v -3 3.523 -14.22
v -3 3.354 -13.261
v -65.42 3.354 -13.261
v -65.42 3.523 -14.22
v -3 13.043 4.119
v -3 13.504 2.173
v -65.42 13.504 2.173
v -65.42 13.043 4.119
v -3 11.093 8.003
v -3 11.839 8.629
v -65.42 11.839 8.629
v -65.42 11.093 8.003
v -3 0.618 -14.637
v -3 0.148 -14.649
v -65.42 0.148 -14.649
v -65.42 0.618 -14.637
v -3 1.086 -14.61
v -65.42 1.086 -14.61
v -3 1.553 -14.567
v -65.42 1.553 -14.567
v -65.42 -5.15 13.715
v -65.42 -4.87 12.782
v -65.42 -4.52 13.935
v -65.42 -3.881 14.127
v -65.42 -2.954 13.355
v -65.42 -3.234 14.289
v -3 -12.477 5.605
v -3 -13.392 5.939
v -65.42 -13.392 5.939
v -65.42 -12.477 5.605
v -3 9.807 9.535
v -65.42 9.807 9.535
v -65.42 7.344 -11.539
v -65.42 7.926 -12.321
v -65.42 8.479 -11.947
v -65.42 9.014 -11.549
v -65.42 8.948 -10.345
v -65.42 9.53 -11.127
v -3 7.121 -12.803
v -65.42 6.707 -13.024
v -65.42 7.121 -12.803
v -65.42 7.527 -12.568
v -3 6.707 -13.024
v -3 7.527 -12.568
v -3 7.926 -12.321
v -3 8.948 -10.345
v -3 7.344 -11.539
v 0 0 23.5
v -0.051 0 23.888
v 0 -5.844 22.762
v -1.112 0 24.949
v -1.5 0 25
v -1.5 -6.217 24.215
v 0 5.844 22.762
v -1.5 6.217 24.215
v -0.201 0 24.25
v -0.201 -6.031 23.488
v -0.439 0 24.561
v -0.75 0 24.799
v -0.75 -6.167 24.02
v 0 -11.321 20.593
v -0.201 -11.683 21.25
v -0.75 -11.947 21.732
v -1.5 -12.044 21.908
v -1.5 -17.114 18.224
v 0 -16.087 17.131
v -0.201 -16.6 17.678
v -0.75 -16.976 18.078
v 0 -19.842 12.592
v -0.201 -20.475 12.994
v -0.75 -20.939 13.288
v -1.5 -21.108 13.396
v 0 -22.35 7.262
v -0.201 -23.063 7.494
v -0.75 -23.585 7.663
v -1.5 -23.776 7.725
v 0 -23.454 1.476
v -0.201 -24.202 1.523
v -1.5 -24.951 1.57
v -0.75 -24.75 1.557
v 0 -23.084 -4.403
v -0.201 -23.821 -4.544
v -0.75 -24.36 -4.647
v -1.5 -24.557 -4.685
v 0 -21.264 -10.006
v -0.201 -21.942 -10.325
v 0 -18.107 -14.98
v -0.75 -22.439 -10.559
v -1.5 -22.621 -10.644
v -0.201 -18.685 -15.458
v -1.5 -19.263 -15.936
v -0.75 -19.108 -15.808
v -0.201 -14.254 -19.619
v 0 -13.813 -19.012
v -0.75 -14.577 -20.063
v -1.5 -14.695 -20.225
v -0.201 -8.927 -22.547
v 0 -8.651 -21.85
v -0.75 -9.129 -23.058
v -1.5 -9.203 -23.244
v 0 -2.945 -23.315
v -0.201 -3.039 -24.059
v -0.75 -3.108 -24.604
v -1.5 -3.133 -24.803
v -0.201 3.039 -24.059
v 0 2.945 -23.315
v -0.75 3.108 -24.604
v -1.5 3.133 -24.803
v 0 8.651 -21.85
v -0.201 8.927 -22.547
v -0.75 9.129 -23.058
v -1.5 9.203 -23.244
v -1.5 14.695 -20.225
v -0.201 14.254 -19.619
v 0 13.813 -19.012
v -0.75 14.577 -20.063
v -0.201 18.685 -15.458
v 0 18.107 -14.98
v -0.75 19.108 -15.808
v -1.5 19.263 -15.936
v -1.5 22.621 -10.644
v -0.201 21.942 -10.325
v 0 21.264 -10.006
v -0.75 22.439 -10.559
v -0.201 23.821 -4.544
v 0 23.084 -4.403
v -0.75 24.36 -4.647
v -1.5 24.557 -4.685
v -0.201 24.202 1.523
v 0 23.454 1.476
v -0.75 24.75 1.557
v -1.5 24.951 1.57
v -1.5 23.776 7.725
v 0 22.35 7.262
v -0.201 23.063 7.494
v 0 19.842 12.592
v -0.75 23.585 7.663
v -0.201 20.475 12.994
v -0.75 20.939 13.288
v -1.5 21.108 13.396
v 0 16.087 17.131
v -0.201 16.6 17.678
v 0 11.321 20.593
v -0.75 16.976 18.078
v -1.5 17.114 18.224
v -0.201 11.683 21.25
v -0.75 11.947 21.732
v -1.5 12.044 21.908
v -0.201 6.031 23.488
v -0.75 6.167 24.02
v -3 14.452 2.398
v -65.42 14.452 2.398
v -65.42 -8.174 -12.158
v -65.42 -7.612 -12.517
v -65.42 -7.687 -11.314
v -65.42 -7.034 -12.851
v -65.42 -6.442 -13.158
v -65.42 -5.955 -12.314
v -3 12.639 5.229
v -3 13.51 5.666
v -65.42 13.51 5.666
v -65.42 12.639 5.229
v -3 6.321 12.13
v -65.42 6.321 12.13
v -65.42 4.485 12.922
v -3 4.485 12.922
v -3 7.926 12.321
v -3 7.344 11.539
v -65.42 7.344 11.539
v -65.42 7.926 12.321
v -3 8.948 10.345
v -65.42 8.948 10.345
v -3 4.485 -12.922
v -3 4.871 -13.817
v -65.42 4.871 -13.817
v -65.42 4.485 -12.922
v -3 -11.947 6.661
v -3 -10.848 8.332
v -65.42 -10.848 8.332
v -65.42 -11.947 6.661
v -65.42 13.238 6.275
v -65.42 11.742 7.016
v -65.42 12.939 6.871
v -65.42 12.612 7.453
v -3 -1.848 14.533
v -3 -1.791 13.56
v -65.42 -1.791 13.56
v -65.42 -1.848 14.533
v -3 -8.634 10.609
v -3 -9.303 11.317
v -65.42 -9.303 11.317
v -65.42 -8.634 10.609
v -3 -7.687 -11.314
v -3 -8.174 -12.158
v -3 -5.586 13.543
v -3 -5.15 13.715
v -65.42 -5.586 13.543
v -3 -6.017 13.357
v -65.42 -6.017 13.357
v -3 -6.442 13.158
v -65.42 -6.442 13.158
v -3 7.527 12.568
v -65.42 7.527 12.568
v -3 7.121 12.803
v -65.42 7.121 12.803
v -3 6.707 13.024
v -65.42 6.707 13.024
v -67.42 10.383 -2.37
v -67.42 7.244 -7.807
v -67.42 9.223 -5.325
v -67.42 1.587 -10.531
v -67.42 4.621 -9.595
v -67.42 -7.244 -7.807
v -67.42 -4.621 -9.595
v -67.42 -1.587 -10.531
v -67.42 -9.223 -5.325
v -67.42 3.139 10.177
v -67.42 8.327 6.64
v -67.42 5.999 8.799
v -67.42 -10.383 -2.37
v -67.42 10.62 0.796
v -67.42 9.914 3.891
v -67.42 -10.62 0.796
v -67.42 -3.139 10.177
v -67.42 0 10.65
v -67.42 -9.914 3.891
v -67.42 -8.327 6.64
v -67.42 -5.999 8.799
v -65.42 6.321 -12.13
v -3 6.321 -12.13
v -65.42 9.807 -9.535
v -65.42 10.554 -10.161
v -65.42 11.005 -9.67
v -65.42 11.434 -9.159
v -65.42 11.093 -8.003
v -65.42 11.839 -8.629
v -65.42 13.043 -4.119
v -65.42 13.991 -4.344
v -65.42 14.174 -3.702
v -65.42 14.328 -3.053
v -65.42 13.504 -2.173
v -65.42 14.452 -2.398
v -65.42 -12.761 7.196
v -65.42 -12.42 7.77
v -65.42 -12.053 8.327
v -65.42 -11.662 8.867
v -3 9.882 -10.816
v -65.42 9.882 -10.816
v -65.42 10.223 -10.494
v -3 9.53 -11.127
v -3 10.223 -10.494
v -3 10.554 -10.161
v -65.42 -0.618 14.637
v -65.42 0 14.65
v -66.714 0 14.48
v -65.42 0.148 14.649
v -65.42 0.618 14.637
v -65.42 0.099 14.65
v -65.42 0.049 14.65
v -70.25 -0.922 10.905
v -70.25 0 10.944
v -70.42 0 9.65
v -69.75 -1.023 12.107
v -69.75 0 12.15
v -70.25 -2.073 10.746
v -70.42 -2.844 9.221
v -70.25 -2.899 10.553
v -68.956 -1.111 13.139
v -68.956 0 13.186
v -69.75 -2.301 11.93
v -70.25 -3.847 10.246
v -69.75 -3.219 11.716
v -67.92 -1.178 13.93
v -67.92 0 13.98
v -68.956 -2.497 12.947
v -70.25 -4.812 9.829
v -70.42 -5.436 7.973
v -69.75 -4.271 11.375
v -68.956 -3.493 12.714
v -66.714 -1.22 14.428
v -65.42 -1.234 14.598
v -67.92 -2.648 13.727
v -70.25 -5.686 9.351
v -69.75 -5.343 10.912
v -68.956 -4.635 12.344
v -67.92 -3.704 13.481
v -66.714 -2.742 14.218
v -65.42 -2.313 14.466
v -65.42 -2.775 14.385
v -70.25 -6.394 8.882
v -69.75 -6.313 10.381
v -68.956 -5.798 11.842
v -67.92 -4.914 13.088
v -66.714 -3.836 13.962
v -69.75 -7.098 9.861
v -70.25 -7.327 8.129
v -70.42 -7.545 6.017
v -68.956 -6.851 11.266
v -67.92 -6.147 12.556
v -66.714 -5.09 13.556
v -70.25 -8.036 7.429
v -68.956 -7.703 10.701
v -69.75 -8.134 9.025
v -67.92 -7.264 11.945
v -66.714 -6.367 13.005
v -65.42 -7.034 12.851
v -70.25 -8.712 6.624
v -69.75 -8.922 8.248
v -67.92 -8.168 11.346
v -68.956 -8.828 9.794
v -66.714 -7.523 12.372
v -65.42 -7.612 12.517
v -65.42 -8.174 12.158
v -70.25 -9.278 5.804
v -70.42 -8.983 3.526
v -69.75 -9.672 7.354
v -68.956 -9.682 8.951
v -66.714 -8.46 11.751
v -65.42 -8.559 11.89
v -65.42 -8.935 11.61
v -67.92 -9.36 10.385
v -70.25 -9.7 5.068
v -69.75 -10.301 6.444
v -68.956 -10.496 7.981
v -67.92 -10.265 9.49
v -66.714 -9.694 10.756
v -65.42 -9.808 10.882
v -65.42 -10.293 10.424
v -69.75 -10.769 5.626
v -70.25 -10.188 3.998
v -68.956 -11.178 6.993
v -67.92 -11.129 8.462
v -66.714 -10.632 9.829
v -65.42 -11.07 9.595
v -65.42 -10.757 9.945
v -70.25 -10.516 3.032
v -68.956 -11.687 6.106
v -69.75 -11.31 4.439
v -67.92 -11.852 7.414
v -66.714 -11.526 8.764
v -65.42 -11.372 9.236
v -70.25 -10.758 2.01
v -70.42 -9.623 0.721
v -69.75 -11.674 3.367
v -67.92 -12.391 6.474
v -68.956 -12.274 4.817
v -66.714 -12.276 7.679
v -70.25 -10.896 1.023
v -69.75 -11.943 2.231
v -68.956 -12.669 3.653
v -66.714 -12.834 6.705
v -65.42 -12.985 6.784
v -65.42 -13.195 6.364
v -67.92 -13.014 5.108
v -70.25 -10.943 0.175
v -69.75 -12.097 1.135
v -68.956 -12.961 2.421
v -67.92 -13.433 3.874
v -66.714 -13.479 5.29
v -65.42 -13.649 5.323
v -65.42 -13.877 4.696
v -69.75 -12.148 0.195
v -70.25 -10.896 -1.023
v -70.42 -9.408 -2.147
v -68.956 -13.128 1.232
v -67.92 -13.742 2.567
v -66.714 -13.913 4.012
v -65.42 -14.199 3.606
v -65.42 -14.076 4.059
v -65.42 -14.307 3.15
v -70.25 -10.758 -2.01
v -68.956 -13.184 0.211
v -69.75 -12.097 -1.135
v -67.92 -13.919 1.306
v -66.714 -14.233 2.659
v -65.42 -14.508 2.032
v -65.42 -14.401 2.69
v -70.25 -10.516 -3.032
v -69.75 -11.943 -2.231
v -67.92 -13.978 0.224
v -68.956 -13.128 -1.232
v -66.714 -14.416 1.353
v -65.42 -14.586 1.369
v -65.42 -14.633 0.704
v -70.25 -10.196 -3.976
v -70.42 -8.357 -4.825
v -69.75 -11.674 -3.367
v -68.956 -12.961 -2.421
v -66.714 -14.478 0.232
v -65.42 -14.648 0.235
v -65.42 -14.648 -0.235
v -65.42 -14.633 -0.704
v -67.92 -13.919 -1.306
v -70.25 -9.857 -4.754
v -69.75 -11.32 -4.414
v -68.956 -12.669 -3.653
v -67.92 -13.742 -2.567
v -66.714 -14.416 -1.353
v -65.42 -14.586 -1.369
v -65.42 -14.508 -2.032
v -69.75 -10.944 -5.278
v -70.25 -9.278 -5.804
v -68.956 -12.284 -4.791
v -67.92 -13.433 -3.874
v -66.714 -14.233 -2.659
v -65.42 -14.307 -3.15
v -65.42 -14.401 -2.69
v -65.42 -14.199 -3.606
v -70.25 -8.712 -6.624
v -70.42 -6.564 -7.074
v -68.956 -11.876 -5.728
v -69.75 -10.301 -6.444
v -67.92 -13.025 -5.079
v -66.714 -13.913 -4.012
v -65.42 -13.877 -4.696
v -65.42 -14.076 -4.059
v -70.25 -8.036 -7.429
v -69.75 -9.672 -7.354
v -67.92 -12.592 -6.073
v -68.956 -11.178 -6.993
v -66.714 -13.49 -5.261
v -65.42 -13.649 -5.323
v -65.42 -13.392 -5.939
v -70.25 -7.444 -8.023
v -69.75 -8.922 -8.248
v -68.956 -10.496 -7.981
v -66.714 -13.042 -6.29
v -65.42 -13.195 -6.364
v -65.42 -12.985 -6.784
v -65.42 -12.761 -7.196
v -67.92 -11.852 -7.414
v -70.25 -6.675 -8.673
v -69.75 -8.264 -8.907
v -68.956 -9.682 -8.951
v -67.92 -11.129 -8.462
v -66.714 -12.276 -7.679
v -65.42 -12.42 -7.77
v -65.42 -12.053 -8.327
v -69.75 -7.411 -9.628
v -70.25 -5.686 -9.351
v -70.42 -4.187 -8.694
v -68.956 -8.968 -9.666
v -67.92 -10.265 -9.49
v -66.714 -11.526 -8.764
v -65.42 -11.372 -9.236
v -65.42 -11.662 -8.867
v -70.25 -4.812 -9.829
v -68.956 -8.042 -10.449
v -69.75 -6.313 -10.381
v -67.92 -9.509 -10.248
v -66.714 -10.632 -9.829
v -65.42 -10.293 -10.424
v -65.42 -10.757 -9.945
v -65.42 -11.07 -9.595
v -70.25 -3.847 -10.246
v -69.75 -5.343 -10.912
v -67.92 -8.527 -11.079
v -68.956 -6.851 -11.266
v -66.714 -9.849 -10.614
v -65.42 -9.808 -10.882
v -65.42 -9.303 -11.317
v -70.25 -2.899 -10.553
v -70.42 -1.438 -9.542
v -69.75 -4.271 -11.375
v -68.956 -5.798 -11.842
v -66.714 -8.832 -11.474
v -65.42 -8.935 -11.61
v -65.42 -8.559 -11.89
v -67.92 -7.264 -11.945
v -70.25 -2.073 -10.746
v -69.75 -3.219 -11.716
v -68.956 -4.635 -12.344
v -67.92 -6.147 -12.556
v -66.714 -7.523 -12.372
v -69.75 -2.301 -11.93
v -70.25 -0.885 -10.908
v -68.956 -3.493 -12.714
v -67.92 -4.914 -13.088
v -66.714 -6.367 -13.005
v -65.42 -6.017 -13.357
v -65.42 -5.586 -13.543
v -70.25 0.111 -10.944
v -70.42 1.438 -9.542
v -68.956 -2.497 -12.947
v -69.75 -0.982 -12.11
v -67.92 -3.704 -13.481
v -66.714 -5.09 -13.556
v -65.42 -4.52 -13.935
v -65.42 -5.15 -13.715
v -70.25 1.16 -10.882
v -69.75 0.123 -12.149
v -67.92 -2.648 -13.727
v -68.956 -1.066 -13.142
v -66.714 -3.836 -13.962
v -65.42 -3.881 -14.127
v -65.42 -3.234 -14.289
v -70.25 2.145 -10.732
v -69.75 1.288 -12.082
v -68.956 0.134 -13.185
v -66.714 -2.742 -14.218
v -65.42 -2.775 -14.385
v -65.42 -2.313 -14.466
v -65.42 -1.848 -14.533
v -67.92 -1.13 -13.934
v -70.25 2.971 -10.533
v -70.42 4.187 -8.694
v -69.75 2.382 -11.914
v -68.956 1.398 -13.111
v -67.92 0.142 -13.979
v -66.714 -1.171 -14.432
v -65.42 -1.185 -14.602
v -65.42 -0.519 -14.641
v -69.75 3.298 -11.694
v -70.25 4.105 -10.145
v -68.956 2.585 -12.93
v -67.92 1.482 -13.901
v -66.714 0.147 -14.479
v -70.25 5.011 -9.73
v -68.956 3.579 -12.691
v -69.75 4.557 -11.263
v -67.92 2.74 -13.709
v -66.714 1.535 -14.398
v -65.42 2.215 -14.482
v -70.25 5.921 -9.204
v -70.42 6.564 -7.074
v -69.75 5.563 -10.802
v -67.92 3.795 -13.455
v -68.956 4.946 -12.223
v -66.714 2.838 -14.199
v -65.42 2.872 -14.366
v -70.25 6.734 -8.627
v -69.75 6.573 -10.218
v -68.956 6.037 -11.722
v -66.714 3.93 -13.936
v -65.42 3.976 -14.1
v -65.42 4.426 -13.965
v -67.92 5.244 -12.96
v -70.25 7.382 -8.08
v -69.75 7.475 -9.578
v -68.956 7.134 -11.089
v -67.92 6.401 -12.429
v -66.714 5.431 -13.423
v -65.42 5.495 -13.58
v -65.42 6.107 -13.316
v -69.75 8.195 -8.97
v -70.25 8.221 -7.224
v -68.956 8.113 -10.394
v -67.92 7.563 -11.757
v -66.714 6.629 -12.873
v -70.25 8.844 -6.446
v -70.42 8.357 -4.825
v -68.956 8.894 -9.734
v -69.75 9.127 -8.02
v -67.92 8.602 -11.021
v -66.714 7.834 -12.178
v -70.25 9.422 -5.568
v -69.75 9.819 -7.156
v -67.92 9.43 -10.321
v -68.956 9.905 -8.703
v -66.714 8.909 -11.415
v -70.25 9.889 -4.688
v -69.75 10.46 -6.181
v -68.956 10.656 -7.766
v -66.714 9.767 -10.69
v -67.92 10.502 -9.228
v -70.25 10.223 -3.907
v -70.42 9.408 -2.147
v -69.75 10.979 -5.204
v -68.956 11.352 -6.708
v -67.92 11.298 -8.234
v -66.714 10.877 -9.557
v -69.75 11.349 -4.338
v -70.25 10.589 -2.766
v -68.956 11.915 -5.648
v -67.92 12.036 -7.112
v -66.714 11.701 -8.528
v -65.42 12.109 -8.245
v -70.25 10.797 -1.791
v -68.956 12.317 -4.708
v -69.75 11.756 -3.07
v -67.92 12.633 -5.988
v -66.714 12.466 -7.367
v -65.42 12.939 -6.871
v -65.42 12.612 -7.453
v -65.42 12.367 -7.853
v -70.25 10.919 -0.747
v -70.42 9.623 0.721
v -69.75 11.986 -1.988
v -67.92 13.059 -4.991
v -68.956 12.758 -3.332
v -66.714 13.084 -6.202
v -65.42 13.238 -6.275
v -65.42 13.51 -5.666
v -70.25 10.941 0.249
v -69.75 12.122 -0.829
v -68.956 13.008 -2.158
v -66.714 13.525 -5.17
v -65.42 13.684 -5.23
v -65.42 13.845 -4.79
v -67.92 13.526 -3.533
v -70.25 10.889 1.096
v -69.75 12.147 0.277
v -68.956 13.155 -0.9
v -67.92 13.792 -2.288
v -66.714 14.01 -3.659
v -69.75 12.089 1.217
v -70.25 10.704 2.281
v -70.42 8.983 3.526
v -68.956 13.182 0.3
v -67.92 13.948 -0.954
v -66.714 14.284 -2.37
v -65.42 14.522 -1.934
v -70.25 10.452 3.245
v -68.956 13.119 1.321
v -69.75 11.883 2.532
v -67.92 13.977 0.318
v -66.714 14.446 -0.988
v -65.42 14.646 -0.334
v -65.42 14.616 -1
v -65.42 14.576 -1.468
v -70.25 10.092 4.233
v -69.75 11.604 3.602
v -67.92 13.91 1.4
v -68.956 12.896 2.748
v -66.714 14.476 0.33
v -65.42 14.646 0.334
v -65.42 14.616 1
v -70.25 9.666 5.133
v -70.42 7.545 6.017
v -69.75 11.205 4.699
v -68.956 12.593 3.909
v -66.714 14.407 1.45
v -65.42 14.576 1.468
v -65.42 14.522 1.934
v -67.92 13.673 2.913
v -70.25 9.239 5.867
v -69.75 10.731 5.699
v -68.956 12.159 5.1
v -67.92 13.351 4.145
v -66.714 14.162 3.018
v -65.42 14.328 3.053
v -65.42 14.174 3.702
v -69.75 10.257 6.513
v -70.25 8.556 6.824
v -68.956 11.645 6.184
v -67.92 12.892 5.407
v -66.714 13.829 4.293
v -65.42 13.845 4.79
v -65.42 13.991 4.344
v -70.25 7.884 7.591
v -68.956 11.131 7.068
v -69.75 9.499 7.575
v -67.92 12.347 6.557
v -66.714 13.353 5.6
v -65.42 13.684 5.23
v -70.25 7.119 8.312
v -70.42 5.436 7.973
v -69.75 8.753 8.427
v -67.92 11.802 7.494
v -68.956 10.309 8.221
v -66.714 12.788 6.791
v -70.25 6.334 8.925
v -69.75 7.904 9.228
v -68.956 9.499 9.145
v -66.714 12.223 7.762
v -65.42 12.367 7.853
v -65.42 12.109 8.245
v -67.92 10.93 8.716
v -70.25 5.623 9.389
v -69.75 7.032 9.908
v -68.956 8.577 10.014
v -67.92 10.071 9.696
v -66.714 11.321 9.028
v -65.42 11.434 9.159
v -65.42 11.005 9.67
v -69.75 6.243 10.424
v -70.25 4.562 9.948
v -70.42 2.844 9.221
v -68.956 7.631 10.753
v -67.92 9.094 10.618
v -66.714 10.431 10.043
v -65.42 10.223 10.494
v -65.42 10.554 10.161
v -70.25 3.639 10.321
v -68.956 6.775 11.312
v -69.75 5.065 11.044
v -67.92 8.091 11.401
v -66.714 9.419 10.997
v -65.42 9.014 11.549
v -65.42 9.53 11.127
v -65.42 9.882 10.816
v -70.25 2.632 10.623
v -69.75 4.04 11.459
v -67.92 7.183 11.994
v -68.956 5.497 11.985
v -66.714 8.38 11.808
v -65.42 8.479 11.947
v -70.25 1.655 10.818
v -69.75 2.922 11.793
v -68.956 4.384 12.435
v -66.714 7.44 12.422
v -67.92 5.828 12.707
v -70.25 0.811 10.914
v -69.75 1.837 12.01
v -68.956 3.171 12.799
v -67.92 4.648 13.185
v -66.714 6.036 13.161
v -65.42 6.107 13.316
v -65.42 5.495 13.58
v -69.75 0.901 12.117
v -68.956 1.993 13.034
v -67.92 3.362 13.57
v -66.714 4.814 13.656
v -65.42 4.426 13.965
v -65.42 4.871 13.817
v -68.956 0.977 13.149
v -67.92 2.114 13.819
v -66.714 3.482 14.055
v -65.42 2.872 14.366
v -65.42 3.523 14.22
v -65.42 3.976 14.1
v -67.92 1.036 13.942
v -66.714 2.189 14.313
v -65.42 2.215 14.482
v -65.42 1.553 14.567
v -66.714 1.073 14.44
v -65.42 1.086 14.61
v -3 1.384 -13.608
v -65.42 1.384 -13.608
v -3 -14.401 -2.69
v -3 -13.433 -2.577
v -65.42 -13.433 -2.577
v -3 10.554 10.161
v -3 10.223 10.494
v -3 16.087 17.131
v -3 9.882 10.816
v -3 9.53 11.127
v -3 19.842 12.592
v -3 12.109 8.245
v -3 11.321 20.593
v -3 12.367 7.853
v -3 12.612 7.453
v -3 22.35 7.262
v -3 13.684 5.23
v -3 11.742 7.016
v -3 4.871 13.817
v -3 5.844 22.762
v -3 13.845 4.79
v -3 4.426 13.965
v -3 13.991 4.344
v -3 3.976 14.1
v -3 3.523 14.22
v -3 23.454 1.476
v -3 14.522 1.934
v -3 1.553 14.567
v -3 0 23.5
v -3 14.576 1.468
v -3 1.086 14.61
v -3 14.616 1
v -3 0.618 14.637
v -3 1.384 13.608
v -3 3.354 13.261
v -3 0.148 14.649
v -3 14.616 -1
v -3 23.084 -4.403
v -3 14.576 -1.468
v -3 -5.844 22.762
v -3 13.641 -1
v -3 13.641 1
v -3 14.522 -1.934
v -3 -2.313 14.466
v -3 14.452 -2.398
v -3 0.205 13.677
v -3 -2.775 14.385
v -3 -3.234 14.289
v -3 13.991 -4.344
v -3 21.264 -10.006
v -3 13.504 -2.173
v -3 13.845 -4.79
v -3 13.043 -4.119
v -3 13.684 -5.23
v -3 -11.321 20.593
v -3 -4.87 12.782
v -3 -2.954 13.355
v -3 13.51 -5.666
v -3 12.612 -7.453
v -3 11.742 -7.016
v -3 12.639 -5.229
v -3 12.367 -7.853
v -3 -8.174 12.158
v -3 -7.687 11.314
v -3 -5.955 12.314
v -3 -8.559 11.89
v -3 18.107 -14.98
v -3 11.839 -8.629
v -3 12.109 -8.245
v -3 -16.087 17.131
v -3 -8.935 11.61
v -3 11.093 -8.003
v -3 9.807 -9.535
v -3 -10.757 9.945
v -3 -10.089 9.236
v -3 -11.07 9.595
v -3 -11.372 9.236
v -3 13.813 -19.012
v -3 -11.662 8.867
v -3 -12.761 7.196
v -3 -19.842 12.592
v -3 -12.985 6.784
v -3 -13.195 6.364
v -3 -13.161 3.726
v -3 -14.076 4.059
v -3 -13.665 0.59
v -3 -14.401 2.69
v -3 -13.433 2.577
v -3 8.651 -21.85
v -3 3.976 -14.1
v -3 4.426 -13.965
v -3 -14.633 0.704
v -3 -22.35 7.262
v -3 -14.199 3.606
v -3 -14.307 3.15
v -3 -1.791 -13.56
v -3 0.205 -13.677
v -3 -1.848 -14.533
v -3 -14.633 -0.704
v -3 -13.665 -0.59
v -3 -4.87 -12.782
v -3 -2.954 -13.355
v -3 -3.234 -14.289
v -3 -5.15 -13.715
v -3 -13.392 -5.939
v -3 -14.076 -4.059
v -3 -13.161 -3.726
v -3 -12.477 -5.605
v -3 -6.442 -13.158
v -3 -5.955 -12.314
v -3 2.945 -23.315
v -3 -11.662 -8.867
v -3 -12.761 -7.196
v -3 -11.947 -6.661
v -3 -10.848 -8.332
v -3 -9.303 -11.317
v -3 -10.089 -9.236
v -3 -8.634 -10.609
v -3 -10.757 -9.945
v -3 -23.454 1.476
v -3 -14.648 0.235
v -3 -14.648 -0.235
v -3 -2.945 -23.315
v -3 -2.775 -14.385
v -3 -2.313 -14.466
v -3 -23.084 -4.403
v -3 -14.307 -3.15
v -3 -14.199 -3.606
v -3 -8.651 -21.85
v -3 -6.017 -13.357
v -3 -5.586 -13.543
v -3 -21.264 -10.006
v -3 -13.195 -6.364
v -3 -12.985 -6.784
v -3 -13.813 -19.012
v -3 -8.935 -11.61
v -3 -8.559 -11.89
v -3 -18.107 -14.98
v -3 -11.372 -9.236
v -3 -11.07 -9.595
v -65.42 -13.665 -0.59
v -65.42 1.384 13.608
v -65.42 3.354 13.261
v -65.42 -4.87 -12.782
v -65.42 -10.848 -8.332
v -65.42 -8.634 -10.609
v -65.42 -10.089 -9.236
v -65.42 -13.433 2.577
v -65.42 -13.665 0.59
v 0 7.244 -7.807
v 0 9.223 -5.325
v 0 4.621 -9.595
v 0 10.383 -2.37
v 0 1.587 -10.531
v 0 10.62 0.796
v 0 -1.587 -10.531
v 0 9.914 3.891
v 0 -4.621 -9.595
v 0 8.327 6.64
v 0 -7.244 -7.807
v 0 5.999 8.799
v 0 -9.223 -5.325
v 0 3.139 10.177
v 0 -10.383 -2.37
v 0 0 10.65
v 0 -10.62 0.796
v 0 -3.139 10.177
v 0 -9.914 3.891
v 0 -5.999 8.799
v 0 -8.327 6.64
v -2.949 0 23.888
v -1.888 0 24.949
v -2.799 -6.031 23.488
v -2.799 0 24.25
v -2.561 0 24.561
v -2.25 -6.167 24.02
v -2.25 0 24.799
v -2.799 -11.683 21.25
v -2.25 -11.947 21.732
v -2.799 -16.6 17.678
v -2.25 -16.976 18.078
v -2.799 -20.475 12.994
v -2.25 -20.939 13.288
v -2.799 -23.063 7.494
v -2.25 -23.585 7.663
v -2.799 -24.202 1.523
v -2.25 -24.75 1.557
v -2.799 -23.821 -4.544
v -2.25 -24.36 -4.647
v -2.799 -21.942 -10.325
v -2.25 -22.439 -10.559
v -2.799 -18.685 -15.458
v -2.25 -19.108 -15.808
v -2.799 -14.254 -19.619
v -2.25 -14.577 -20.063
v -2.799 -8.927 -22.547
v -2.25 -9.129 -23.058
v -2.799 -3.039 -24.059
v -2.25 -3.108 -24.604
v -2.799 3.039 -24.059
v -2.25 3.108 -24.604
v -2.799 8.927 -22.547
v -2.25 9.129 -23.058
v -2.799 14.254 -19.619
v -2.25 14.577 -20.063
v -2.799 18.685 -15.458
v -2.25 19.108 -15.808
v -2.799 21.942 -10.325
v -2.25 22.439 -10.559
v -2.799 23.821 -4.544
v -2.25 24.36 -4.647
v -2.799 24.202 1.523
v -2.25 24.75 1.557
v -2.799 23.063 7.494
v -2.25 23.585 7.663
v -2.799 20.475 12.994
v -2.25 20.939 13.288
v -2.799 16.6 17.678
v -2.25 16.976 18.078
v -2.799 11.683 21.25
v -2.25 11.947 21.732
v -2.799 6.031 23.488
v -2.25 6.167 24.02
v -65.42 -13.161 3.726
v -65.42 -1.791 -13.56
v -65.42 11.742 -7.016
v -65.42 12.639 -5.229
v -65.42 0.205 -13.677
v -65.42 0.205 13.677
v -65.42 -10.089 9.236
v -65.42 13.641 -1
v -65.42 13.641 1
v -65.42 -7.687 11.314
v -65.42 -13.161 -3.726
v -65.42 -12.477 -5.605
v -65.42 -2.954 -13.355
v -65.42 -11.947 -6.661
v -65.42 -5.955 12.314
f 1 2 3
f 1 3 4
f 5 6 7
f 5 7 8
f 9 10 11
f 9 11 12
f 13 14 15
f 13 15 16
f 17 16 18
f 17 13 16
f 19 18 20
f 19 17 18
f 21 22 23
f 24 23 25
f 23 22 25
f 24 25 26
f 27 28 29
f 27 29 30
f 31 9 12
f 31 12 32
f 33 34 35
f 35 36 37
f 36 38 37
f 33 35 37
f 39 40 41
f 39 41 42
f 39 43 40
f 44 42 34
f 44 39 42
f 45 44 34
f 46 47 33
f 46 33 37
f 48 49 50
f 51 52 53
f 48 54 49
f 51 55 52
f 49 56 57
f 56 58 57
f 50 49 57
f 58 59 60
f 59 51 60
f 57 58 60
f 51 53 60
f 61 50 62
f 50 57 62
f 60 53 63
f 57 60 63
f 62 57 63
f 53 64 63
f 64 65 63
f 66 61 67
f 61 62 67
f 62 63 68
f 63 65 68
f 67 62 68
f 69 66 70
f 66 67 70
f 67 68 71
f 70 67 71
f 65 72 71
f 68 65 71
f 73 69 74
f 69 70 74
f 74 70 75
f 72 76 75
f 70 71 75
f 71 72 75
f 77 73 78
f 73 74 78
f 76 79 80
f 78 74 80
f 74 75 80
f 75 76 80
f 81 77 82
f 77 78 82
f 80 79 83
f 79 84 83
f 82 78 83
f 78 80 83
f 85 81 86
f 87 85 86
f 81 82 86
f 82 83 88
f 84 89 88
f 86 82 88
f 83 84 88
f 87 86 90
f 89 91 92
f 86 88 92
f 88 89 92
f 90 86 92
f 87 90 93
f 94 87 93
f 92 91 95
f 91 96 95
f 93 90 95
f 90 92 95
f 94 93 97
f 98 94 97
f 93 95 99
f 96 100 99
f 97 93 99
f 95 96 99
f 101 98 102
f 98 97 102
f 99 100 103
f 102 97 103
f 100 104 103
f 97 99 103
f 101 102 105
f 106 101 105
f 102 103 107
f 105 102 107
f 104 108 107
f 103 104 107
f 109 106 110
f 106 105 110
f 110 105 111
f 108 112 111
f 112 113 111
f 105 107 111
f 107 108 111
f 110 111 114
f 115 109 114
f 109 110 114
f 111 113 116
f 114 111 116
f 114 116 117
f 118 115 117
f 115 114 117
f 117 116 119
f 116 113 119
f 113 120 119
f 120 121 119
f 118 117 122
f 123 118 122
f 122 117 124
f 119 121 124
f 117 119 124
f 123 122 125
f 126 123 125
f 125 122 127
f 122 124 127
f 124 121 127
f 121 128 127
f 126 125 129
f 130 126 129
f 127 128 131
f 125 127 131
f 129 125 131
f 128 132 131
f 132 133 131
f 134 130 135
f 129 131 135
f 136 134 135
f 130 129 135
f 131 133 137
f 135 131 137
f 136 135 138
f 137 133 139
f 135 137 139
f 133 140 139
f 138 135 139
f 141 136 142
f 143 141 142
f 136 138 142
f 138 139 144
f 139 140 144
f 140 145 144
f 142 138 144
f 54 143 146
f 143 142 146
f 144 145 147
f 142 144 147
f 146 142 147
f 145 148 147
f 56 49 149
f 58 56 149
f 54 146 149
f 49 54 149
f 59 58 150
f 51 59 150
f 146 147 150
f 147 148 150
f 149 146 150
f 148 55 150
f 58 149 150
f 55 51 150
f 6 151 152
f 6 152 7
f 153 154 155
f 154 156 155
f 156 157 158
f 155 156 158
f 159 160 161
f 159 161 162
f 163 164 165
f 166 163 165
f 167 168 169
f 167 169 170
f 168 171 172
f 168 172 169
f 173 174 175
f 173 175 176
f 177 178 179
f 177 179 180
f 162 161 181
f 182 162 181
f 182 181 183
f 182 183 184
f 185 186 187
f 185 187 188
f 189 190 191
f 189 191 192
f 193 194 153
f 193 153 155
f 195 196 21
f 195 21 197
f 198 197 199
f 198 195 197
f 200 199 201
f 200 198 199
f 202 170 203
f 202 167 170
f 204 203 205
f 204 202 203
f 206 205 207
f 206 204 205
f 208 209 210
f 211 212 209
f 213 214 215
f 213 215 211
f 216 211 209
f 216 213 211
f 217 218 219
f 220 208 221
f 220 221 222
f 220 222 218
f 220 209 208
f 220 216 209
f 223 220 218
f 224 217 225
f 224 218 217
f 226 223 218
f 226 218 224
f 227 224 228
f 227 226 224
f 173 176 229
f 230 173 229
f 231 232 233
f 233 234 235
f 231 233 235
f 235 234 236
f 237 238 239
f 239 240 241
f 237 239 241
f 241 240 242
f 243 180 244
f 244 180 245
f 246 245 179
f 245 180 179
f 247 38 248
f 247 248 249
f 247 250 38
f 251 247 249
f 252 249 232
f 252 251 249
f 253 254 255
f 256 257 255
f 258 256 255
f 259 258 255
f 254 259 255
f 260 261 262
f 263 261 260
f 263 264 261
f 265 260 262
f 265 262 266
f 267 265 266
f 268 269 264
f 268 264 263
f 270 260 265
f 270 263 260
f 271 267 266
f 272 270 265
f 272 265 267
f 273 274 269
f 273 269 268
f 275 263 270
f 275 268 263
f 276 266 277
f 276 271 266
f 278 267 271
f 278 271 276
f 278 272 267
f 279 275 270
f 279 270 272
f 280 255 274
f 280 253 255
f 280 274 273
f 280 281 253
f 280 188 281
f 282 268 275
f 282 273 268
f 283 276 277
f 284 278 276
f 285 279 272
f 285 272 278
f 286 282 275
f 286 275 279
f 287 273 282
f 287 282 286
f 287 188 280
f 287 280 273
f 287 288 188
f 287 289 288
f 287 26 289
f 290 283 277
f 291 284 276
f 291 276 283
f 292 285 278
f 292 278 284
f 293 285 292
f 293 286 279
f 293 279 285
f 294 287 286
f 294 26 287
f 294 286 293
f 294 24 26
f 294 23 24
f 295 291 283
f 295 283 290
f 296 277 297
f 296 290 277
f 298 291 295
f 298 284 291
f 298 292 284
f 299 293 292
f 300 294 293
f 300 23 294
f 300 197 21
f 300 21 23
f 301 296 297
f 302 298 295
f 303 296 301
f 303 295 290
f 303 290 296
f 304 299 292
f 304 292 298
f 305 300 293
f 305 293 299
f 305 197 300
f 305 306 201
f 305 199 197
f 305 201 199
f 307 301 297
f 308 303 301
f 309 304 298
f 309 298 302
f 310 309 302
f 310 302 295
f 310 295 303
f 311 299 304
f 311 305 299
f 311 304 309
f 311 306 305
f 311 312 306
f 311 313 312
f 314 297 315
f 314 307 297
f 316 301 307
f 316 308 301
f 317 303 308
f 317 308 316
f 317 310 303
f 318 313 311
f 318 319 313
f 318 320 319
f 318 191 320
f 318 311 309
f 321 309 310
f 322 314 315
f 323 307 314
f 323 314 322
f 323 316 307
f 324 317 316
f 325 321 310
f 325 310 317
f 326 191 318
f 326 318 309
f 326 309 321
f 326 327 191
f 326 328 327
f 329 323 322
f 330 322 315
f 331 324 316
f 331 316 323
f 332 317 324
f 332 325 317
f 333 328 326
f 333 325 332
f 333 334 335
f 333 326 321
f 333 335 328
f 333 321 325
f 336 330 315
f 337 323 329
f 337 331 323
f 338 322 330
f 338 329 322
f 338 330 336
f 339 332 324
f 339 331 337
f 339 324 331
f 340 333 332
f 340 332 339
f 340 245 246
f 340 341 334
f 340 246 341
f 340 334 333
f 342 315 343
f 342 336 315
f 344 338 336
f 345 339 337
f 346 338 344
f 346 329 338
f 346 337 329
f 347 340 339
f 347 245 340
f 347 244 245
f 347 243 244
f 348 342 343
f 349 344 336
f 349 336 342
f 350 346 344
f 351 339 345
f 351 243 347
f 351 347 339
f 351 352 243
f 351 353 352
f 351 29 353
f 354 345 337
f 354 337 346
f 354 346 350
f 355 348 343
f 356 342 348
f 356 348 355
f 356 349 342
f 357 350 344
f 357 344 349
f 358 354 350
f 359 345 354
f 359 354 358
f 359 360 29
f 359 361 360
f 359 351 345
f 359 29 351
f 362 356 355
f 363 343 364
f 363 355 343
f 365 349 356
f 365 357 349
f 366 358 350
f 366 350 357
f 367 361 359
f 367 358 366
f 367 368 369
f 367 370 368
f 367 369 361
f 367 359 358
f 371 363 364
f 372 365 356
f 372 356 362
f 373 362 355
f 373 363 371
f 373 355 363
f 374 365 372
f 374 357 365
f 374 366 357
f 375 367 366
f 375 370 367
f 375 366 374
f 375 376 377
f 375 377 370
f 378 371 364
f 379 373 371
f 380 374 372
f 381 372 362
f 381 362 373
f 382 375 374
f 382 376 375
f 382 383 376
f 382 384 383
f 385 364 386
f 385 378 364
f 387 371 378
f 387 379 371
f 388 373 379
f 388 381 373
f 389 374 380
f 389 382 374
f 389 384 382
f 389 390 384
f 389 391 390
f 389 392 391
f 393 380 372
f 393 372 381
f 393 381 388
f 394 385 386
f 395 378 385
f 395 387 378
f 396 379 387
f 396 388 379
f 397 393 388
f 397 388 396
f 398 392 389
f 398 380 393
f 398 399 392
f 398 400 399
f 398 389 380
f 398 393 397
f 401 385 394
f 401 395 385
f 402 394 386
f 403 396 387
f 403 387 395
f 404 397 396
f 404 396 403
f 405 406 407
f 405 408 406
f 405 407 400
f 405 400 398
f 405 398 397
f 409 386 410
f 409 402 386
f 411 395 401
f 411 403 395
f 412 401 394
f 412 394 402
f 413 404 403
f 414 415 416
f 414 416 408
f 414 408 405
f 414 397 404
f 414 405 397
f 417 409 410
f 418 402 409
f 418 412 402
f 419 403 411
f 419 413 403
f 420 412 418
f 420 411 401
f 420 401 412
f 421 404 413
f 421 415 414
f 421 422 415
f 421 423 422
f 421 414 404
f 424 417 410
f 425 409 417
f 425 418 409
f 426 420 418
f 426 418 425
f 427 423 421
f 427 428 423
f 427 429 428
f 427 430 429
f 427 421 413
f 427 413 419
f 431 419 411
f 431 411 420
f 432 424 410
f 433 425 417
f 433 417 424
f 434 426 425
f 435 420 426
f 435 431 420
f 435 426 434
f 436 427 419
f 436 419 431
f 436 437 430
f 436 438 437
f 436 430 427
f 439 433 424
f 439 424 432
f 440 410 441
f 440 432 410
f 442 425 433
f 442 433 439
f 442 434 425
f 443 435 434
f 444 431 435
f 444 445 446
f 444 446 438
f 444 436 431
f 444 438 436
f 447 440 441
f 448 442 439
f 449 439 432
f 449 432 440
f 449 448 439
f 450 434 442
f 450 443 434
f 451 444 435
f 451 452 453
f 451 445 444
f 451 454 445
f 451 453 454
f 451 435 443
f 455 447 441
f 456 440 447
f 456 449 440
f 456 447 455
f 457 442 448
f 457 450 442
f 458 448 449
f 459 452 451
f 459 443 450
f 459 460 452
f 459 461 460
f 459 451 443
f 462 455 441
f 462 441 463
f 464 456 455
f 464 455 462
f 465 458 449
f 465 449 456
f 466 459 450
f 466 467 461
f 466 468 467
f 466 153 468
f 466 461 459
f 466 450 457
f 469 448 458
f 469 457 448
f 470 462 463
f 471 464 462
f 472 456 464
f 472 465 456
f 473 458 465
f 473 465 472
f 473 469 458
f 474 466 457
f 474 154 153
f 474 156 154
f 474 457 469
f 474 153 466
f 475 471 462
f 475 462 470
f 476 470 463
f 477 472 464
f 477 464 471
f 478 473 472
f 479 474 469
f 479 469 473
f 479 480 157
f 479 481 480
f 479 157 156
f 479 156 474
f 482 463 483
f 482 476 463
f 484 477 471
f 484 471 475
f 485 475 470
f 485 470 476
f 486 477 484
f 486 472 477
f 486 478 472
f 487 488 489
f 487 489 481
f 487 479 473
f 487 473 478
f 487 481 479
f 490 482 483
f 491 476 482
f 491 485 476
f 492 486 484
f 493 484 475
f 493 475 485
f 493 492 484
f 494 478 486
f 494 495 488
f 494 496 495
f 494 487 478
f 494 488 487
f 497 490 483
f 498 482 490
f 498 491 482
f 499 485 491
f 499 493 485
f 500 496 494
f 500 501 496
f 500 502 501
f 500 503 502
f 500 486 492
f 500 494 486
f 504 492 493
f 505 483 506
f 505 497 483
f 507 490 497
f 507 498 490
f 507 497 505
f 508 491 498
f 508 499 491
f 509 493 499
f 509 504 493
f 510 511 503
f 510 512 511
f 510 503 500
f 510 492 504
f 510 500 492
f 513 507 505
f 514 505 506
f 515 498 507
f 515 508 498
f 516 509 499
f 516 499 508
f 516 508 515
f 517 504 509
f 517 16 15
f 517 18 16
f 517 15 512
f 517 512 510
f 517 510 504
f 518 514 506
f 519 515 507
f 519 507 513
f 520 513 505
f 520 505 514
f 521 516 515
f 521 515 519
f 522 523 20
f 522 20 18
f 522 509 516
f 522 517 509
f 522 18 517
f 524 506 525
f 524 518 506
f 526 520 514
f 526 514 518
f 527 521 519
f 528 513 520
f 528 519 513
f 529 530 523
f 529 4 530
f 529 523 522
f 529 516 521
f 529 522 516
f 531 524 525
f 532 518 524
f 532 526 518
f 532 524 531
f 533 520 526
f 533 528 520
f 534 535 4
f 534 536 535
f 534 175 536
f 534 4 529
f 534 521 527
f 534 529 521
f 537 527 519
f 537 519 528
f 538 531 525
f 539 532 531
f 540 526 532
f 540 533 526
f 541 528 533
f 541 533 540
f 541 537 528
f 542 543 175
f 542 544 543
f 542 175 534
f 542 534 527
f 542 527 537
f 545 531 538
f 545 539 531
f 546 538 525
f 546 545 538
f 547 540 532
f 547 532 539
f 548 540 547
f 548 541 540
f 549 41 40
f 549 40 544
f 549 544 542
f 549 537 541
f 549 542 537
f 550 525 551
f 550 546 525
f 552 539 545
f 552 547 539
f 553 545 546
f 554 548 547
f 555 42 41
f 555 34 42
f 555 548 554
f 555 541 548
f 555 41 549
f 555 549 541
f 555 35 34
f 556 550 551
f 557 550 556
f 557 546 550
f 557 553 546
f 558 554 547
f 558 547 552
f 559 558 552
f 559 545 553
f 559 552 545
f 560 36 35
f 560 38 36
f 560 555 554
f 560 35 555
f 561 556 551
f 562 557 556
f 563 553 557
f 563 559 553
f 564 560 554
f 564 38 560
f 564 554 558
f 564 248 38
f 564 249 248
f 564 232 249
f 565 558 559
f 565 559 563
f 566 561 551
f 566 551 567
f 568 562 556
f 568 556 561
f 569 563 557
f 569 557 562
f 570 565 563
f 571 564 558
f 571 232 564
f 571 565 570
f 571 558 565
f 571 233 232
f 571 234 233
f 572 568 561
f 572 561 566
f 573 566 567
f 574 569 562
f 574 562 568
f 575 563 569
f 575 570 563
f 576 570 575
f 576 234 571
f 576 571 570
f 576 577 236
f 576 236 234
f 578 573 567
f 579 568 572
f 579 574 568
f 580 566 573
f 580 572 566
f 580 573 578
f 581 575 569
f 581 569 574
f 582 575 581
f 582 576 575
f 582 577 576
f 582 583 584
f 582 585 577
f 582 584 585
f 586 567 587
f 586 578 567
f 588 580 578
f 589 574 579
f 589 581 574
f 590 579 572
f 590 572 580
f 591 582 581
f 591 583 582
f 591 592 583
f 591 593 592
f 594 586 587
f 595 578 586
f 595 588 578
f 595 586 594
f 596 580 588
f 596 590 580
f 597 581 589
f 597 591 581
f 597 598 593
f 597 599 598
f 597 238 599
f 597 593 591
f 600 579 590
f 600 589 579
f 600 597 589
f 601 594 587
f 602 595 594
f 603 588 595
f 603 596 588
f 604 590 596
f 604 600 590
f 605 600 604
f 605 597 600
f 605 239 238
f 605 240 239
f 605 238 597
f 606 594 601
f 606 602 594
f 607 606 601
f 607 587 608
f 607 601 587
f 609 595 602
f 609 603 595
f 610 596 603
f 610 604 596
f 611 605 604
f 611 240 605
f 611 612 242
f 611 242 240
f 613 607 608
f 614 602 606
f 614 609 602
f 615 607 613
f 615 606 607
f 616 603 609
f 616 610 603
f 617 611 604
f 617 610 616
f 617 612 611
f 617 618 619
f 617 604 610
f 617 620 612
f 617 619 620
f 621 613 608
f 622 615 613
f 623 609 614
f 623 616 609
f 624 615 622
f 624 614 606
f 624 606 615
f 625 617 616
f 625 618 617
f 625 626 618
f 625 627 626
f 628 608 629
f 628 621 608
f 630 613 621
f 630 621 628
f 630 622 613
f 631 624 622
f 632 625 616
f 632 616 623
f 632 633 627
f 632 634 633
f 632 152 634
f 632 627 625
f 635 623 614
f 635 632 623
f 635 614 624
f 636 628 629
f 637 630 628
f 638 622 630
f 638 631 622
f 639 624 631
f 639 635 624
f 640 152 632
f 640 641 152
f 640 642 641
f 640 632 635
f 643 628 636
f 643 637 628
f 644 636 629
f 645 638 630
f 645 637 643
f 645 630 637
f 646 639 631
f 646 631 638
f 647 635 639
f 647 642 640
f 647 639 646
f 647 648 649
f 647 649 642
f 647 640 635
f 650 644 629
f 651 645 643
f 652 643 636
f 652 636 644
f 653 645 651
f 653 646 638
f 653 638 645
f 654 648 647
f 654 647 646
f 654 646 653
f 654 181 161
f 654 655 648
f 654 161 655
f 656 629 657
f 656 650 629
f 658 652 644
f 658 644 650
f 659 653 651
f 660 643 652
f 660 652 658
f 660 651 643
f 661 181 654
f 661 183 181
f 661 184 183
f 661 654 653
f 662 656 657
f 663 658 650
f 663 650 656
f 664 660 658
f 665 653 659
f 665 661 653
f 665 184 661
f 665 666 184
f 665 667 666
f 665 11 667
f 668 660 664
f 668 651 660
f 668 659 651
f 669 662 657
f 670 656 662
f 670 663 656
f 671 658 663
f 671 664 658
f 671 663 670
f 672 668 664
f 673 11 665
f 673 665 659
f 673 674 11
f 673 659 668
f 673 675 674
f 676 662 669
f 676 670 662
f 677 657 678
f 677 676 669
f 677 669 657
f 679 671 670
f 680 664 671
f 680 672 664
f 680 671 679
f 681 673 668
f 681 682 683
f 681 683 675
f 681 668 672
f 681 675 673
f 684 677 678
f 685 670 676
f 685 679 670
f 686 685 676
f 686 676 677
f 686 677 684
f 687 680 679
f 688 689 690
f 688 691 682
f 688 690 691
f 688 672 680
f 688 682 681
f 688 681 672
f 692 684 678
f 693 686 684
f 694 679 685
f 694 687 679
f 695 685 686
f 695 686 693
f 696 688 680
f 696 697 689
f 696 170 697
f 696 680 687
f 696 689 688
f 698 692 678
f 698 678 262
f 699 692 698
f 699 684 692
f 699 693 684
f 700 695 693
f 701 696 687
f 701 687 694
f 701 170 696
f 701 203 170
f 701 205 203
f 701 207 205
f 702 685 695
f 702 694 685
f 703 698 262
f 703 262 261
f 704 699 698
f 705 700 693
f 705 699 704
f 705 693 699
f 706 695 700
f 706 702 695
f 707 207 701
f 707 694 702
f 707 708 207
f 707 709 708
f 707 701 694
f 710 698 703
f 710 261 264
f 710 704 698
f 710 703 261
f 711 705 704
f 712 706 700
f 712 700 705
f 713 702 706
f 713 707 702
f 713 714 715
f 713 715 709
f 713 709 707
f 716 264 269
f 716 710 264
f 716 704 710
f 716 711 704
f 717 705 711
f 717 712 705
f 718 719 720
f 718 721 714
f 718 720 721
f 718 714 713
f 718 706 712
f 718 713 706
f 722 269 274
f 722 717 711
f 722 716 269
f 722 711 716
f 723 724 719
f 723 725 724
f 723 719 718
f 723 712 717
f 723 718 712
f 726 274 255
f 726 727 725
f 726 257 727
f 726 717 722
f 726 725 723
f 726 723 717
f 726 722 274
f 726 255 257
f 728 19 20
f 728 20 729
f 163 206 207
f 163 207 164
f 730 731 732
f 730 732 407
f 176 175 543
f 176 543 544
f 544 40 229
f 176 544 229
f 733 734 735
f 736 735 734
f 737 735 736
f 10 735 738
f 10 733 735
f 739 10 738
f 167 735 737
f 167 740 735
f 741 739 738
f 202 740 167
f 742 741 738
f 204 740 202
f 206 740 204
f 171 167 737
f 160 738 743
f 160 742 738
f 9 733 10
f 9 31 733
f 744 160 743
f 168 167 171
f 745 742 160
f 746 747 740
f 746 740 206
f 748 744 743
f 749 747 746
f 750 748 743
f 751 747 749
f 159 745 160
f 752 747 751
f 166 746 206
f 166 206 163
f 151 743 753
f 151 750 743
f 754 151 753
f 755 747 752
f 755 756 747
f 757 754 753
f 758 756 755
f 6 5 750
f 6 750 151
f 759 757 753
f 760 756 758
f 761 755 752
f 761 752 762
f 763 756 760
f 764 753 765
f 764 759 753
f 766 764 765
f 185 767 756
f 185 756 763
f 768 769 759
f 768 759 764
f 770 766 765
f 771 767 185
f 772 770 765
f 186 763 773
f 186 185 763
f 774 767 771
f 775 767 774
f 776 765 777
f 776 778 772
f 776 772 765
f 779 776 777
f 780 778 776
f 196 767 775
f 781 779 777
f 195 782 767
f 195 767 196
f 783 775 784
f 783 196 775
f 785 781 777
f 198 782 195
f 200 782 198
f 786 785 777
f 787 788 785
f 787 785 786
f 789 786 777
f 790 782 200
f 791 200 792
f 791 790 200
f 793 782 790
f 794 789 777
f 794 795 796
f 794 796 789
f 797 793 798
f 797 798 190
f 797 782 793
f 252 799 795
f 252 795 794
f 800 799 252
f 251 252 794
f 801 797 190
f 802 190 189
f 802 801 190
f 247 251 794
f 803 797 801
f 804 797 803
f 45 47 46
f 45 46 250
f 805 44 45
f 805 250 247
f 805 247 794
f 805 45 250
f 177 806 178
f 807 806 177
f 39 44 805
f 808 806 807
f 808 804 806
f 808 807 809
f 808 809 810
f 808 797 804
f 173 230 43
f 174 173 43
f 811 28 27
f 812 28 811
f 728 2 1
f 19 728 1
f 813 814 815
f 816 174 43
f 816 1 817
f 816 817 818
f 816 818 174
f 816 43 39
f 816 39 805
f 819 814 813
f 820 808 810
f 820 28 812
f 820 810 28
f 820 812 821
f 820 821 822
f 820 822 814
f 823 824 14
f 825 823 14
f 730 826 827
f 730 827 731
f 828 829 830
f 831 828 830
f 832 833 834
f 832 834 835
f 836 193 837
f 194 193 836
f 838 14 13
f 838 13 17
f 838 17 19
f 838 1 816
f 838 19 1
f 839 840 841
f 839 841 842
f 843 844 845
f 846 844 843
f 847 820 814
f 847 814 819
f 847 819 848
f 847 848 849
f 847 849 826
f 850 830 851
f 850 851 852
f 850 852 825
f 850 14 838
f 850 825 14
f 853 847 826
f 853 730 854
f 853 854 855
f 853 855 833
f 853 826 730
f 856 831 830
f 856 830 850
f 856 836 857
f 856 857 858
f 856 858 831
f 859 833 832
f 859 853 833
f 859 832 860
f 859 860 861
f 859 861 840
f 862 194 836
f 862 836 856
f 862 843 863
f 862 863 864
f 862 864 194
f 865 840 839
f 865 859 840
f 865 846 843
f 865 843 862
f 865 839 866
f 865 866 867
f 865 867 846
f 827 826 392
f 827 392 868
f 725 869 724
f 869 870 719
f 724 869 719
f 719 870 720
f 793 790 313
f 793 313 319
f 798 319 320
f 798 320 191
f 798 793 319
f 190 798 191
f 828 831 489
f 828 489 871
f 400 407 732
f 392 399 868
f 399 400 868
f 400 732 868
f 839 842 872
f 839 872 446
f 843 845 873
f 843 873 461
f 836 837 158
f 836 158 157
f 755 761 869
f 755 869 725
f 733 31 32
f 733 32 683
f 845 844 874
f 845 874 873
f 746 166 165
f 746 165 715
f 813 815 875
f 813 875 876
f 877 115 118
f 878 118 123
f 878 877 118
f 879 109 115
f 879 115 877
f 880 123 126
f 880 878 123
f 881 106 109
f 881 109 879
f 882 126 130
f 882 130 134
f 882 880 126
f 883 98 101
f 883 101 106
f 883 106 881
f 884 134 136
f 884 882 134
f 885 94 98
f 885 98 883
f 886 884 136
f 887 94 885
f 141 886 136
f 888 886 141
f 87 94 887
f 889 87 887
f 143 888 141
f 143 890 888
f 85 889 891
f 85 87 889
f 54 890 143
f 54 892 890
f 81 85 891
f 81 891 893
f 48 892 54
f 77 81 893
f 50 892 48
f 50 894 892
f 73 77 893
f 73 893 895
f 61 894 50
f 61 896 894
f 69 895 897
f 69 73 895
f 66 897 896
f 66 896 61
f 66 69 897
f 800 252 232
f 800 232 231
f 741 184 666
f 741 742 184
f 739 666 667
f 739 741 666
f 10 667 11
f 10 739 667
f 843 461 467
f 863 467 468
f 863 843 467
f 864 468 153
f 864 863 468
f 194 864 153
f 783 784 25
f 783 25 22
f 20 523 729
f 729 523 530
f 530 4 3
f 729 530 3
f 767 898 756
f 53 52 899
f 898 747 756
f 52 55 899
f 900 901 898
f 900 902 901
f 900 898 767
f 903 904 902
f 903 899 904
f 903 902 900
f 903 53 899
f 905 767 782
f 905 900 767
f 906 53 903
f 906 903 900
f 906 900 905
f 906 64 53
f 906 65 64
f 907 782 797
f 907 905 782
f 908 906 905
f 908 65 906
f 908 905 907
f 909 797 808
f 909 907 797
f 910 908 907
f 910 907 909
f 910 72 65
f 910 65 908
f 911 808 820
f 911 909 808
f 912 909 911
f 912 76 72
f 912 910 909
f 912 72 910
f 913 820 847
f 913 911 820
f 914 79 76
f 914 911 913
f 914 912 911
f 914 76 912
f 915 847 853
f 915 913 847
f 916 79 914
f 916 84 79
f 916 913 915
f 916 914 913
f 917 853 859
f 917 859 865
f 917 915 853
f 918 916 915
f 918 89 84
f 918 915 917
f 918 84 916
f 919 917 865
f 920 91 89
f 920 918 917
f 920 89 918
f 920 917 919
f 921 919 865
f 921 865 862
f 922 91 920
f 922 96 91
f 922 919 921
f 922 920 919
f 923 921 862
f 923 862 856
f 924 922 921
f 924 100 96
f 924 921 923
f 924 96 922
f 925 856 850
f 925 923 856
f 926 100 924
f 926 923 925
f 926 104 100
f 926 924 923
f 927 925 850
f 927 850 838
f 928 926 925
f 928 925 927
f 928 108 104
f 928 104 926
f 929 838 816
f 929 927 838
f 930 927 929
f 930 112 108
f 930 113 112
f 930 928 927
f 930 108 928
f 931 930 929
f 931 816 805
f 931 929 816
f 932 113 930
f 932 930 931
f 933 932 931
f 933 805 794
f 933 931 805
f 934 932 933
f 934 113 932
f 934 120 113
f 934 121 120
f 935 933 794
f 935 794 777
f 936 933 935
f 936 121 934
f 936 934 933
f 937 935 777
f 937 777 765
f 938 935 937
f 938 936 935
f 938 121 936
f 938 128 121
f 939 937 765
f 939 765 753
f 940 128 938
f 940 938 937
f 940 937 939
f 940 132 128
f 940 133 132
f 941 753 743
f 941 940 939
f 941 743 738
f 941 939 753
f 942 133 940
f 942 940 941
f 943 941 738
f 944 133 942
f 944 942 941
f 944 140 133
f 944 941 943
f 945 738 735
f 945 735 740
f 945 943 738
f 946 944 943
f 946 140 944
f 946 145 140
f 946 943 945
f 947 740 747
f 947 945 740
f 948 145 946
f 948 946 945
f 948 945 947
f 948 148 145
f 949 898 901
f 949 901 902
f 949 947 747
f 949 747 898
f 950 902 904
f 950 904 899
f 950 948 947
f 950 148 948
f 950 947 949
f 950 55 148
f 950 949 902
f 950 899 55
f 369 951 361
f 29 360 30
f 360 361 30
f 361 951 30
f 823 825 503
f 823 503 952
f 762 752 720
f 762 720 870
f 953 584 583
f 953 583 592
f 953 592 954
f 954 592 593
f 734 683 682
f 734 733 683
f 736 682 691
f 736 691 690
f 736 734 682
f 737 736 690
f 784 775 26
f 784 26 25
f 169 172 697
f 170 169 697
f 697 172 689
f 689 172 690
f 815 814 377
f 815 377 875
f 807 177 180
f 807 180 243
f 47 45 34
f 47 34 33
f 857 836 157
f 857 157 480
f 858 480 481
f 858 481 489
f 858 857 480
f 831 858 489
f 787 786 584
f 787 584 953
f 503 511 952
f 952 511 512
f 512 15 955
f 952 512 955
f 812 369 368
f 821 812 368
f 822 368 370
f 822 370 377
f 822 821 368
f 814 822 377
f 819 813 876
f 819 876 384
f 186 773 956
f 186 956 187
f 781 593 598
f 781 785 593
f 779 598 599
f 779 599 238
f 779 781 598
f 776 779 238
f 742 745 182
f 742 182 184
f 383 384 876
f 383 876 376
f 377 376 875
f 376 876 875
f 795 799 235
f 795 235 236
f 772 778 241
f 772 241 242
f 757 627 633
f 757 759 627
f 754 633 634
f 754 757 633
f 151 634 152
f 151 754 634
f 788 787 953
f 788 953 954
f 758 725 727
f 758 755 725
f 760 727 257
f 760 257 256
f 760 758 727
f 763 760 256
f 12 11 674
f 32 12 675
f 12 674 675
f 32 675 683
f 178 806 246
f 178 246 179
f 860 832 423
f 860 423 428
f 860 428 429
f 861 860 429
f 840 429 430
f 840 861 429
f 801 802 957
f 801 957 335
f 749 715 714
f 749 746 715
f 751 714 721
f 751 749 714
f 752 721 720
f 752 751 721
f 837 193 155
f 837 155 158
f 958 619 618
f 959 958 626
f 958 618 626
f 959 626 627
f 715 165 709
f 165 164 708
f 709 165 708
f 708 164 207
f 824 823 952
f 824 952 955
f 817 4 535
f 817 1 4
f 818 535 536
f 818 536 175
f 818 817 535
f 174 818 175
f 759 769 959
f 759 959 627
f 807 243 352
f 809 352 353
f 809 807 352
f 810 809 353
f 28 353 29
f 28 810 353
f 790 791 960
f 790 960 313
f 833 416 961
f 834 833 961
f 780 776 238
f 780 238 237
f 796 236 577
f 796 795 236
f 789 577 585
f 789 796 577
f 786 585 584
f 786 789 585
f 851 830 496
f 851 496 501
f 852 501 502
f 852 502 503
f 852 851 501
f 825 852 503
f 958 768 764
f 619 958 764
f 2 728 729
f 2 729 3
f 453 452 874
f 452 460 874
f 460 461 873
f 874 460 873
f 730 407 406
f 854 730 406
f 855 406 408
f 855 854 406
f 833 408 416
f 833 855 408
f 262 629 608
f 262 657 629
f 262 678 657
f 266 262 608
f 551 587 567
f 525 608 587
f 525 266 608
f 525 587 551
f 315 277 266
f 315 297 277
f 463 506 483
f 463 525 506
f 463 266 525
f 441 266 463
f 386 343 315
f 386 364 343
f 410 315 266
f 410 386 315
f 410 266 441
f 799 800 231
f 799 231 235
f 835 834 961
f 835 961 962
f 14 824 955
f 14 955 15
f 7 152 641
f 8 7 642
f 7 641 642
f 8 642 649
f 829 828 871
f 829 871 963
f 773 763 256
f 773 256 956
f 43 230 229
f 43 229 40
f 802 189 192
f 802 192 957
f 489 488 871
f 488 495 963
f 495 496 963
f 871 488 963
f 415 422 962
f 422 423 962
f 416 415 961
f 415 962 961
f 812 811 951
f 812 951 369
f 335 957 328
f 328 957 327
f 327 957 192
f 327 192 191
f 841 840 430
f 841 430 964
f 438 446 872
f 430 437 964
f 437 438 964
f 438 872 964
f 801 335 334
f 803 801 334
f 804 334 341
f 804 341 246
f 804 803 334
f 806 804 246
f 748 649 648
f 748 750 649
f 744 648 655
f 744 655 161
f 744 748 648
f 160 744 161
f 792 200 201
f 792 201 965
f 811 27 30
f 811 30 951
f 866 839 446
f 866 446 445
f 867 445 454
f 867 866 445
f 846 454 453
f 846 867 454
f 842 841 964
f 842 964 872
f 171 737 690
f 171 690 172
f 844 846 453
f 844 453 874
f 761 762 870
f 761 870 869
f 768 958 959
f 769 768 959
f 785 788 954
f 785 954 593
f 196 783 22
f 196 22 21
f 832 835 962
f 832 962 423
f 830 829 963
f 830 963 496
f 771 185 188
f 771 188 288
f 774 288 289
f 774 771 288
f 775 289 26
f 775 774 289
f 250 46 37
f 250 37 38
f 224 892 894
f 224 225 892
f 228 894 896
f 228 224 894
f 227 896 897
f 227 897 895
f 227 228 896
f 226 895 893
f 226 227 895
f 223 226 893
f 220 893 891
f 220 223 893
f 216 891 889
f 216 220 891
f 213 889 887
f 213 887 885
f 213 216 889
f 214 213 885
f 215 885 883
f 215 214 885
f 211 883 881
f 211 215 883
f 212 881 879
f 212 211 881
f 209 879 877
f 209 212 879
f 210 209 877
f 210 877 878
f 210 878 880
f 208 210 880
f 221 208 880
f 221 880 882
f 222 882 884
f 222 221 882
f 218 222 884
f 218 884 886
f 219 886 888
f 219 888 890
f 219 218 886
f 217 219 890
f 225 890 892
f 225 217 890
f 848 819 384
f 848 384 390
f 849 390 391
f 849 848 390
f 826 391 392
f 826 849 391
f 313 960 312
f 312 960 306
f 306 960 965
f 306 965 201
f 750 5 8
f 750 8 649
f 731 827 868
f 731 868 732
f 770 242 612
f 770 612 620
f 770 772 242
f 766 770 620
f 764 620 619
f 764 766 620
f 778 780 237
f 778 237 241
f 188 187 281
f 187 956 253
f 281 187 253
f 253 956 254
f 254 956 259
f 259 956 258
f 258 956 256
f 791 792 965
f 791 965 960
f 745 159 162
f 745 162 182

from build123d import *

# Parameters (mm, degrees)
FILLET1_R          = 1.5
SKETCH3_W          = 2
SKETCH3_H          = 2
CUT_EXTRUDE1_DEPTH = 62.42


with BuildPart() as part:
    # Sketch2 → Revolve1 (revolve)
    with BuildSketch(Plane.XY, mode=Mode.PRIVATE) as revolve1_sk:
        with BuildLine():
            Line((0, 25), (0, 10.65))
            Line((0, 10.65), (-67.42, 10.65))
            Line((-67.42, 10.65), (-67.42, 0))
            Line((-67.42, 0), (-70.42, 0))
            Line((-70.42, 0), (-70.42, 9.65))
            ThreePointArc((-70.42, 9.65), (-68.955533906, 13.185533906), (-65.42, 14.65))
            Line((-65.42, 14.65), (-3, 14.65))
            Line((-3, 14.65), (-3, 25))
            Line((-3, 25), (0, 25))
        make_face()
    revolve(revolve1_sk.sketch.rotate(Axis((-556.896186161, 0, 0), (1, 0, 0)), 90), axis=Axis((-556.896186161, 0, 0), (1, 0, 0)))

    # Fillet1
    fillet1_edges = [part.edges().sort_by_distance(p)[0] for p in [
        (0, 0, -25),
        (-3, 0, -25),
    ]]
    fillet(fillet1_edges, radius=FILLET1_R - 0.0001)  # a hair under: the kernel refuses the full size

    # Sketch3 → Cut-Extrude1 (cut)
    with BuildSketch(Plane.ZY.offset(3)):
        Polygon((2.6341252, 15.450463157), (2.172893459, 13.504373416), (4.1189832, 13.043141675), (4.580214941, 14.989231416), align=None)
        with Locations((0, 14.641465)):
            Rectangle(SKETCH3_W, SKETCH3_H)
        Polygon((6.126244029, 14.426522847), (5.228645668, 12.639257566), (7.015910949, 11.741659206), (7.913509309, 13.528924486), align=None)
        Polygon((9.288095456, 12.624844955), (8.002520237, 11.092756069), (9.534609123, 9.80718085), (10.820184342, 11.339269736), align=None)
        Polygon((11.949223253, 10.142558404), (10.344976868, 8.948241221), (11.539294051, 7.343994835), (13.143540437, 8.538312019), align=None)
        Polygon((13.966165332, 7.113483905), (12.129733118, 6.321324373), (12.92189265, 4.484892159), (14.758324864, 5.277051691), align=None)
        Polygon((15.230187823, 3.700919646), (13.260572317, 3.353623291), (13.607868672, 1.384007785), (15.577484178, 1.73130414), align=None)
        Polygon((15.673146946, 0.088837852), (13.676530629, 0.20512751), (13.560240971, -1.791488807), (15.556857288, -1.907778465), align=None)
        Polygon((15.27116266, -3.528033214), (13.355183635, -2.954426749), (12.78157717, -4.870405773), (14.697556195, -5.444012239), align=None)
        Polygon((14.045906042, -6.954707096), (12.313855235, -5.954707096), (11.313855235, -7.686757904), (13.045906042, -8.686757904), align=None)
        Polygon((12.063430994, -10.006450919), (10.608683711, -8.633967643), (9.236200436, -10.088714926), (10.690947719, -11.461198202), align=None)
        Polygon((9.430613259, -12.518744382), (8.331595303, -10.847768759), (6.66061968, -11.946786715), (7.759637636, -13.617762338), align=None)
        Polygon((6.289388722, -14.356149095), (5.605348435, -12.476763854), (3.725963194, -13.160804141), (4.41000348, -15.040189382), align=None)
        Polygon((2.809101611, -15.419610095), (2.576915783, -13.43313338), (0.590439067, -13.665319208), (0.822624895, -15.651795923), align=None)
        Polygon((-0.822624895, -15.651795923), (-0.590439067, -13.665319208), (-2.576915783, -13.43313338), (-2.809101611, -15.419610095), align=None)
        Polygon((-4.41000348, -15.040189382), (-3.725963194, -13.160804141), (-5.605348435, -12.476763854), (-6.289388722, -14.356149095), align=None)
        Polygon((-7.759637636, -13.617762338), (-6.66061968, -11.946786715), (-8.331595303, -10.847768759), (-9.430613259, -12.518744382), align=None)
        Polygon((-10.690947719, -11.461198202), (-9.236200436, -10.088714926), (-10.608683711, -8.633967643), (-12.063430994, -10.006450919), align=None)
        Polygon((-13.045906042, -8.686757904), (-11.313855235, -7.686757904), (-12.313855235, -5.954707096), (-14.045906042, -6.954707096), align=None)
        Polygon((-14.697556195, -5.444012239), (-12.78157717, -4.870405773), (-13.355183635, -2.954426749), (-15.27116266, -3.528033214), align=None)
        Polygon((-15.556857288, -1.907778465), (-13.560240971, -1.791488807), (-13.676530629, 0.20512751), (-15.673146946, 0.088837852), align=None)
        Polygon((-15.577484178, 1.73130414), (-13.607868672, 1.384007785), (-13.260572317, 3.353623291), (-15.230187823, 3.700919646), align=None)
        Polygon((-14.758324864, 5.277051691), (-12.92189265, 4.484892159), (-12.129733118, 6.321324373), (-13.966165332, 7.113483905), align=None)
        Polygon((-13.143540437, 8.538312019), (-11.539294051, 7.343994835), (-10.344976868, 8.948241221), (-11.949223253, 10.142558404), align=None)
        Polygon((-10.820184342, 11.339269736), (-9.534609123, 9.80718085), (-8.002520237, 11.092756069), (-9.288095456, 12.624844955), align=None)
        Polygon((-7.913509309, 13.528924486), (-7.015910949, 11.741659206), (-5.228645668, 12.639257566), (-6.126244029, 14.426522847), align=None)
        Polygon((-4.580214941, 14.989231416), (-4.1189832, 13.043141675), (-2.172893459, 13.504373416), (-2.6341252, 15.450463157), align=None)
    extrude(amount=CUT_EXTRUDE1_DEPTH, mode=Mode.SUBTRACT)


solid = part.part
